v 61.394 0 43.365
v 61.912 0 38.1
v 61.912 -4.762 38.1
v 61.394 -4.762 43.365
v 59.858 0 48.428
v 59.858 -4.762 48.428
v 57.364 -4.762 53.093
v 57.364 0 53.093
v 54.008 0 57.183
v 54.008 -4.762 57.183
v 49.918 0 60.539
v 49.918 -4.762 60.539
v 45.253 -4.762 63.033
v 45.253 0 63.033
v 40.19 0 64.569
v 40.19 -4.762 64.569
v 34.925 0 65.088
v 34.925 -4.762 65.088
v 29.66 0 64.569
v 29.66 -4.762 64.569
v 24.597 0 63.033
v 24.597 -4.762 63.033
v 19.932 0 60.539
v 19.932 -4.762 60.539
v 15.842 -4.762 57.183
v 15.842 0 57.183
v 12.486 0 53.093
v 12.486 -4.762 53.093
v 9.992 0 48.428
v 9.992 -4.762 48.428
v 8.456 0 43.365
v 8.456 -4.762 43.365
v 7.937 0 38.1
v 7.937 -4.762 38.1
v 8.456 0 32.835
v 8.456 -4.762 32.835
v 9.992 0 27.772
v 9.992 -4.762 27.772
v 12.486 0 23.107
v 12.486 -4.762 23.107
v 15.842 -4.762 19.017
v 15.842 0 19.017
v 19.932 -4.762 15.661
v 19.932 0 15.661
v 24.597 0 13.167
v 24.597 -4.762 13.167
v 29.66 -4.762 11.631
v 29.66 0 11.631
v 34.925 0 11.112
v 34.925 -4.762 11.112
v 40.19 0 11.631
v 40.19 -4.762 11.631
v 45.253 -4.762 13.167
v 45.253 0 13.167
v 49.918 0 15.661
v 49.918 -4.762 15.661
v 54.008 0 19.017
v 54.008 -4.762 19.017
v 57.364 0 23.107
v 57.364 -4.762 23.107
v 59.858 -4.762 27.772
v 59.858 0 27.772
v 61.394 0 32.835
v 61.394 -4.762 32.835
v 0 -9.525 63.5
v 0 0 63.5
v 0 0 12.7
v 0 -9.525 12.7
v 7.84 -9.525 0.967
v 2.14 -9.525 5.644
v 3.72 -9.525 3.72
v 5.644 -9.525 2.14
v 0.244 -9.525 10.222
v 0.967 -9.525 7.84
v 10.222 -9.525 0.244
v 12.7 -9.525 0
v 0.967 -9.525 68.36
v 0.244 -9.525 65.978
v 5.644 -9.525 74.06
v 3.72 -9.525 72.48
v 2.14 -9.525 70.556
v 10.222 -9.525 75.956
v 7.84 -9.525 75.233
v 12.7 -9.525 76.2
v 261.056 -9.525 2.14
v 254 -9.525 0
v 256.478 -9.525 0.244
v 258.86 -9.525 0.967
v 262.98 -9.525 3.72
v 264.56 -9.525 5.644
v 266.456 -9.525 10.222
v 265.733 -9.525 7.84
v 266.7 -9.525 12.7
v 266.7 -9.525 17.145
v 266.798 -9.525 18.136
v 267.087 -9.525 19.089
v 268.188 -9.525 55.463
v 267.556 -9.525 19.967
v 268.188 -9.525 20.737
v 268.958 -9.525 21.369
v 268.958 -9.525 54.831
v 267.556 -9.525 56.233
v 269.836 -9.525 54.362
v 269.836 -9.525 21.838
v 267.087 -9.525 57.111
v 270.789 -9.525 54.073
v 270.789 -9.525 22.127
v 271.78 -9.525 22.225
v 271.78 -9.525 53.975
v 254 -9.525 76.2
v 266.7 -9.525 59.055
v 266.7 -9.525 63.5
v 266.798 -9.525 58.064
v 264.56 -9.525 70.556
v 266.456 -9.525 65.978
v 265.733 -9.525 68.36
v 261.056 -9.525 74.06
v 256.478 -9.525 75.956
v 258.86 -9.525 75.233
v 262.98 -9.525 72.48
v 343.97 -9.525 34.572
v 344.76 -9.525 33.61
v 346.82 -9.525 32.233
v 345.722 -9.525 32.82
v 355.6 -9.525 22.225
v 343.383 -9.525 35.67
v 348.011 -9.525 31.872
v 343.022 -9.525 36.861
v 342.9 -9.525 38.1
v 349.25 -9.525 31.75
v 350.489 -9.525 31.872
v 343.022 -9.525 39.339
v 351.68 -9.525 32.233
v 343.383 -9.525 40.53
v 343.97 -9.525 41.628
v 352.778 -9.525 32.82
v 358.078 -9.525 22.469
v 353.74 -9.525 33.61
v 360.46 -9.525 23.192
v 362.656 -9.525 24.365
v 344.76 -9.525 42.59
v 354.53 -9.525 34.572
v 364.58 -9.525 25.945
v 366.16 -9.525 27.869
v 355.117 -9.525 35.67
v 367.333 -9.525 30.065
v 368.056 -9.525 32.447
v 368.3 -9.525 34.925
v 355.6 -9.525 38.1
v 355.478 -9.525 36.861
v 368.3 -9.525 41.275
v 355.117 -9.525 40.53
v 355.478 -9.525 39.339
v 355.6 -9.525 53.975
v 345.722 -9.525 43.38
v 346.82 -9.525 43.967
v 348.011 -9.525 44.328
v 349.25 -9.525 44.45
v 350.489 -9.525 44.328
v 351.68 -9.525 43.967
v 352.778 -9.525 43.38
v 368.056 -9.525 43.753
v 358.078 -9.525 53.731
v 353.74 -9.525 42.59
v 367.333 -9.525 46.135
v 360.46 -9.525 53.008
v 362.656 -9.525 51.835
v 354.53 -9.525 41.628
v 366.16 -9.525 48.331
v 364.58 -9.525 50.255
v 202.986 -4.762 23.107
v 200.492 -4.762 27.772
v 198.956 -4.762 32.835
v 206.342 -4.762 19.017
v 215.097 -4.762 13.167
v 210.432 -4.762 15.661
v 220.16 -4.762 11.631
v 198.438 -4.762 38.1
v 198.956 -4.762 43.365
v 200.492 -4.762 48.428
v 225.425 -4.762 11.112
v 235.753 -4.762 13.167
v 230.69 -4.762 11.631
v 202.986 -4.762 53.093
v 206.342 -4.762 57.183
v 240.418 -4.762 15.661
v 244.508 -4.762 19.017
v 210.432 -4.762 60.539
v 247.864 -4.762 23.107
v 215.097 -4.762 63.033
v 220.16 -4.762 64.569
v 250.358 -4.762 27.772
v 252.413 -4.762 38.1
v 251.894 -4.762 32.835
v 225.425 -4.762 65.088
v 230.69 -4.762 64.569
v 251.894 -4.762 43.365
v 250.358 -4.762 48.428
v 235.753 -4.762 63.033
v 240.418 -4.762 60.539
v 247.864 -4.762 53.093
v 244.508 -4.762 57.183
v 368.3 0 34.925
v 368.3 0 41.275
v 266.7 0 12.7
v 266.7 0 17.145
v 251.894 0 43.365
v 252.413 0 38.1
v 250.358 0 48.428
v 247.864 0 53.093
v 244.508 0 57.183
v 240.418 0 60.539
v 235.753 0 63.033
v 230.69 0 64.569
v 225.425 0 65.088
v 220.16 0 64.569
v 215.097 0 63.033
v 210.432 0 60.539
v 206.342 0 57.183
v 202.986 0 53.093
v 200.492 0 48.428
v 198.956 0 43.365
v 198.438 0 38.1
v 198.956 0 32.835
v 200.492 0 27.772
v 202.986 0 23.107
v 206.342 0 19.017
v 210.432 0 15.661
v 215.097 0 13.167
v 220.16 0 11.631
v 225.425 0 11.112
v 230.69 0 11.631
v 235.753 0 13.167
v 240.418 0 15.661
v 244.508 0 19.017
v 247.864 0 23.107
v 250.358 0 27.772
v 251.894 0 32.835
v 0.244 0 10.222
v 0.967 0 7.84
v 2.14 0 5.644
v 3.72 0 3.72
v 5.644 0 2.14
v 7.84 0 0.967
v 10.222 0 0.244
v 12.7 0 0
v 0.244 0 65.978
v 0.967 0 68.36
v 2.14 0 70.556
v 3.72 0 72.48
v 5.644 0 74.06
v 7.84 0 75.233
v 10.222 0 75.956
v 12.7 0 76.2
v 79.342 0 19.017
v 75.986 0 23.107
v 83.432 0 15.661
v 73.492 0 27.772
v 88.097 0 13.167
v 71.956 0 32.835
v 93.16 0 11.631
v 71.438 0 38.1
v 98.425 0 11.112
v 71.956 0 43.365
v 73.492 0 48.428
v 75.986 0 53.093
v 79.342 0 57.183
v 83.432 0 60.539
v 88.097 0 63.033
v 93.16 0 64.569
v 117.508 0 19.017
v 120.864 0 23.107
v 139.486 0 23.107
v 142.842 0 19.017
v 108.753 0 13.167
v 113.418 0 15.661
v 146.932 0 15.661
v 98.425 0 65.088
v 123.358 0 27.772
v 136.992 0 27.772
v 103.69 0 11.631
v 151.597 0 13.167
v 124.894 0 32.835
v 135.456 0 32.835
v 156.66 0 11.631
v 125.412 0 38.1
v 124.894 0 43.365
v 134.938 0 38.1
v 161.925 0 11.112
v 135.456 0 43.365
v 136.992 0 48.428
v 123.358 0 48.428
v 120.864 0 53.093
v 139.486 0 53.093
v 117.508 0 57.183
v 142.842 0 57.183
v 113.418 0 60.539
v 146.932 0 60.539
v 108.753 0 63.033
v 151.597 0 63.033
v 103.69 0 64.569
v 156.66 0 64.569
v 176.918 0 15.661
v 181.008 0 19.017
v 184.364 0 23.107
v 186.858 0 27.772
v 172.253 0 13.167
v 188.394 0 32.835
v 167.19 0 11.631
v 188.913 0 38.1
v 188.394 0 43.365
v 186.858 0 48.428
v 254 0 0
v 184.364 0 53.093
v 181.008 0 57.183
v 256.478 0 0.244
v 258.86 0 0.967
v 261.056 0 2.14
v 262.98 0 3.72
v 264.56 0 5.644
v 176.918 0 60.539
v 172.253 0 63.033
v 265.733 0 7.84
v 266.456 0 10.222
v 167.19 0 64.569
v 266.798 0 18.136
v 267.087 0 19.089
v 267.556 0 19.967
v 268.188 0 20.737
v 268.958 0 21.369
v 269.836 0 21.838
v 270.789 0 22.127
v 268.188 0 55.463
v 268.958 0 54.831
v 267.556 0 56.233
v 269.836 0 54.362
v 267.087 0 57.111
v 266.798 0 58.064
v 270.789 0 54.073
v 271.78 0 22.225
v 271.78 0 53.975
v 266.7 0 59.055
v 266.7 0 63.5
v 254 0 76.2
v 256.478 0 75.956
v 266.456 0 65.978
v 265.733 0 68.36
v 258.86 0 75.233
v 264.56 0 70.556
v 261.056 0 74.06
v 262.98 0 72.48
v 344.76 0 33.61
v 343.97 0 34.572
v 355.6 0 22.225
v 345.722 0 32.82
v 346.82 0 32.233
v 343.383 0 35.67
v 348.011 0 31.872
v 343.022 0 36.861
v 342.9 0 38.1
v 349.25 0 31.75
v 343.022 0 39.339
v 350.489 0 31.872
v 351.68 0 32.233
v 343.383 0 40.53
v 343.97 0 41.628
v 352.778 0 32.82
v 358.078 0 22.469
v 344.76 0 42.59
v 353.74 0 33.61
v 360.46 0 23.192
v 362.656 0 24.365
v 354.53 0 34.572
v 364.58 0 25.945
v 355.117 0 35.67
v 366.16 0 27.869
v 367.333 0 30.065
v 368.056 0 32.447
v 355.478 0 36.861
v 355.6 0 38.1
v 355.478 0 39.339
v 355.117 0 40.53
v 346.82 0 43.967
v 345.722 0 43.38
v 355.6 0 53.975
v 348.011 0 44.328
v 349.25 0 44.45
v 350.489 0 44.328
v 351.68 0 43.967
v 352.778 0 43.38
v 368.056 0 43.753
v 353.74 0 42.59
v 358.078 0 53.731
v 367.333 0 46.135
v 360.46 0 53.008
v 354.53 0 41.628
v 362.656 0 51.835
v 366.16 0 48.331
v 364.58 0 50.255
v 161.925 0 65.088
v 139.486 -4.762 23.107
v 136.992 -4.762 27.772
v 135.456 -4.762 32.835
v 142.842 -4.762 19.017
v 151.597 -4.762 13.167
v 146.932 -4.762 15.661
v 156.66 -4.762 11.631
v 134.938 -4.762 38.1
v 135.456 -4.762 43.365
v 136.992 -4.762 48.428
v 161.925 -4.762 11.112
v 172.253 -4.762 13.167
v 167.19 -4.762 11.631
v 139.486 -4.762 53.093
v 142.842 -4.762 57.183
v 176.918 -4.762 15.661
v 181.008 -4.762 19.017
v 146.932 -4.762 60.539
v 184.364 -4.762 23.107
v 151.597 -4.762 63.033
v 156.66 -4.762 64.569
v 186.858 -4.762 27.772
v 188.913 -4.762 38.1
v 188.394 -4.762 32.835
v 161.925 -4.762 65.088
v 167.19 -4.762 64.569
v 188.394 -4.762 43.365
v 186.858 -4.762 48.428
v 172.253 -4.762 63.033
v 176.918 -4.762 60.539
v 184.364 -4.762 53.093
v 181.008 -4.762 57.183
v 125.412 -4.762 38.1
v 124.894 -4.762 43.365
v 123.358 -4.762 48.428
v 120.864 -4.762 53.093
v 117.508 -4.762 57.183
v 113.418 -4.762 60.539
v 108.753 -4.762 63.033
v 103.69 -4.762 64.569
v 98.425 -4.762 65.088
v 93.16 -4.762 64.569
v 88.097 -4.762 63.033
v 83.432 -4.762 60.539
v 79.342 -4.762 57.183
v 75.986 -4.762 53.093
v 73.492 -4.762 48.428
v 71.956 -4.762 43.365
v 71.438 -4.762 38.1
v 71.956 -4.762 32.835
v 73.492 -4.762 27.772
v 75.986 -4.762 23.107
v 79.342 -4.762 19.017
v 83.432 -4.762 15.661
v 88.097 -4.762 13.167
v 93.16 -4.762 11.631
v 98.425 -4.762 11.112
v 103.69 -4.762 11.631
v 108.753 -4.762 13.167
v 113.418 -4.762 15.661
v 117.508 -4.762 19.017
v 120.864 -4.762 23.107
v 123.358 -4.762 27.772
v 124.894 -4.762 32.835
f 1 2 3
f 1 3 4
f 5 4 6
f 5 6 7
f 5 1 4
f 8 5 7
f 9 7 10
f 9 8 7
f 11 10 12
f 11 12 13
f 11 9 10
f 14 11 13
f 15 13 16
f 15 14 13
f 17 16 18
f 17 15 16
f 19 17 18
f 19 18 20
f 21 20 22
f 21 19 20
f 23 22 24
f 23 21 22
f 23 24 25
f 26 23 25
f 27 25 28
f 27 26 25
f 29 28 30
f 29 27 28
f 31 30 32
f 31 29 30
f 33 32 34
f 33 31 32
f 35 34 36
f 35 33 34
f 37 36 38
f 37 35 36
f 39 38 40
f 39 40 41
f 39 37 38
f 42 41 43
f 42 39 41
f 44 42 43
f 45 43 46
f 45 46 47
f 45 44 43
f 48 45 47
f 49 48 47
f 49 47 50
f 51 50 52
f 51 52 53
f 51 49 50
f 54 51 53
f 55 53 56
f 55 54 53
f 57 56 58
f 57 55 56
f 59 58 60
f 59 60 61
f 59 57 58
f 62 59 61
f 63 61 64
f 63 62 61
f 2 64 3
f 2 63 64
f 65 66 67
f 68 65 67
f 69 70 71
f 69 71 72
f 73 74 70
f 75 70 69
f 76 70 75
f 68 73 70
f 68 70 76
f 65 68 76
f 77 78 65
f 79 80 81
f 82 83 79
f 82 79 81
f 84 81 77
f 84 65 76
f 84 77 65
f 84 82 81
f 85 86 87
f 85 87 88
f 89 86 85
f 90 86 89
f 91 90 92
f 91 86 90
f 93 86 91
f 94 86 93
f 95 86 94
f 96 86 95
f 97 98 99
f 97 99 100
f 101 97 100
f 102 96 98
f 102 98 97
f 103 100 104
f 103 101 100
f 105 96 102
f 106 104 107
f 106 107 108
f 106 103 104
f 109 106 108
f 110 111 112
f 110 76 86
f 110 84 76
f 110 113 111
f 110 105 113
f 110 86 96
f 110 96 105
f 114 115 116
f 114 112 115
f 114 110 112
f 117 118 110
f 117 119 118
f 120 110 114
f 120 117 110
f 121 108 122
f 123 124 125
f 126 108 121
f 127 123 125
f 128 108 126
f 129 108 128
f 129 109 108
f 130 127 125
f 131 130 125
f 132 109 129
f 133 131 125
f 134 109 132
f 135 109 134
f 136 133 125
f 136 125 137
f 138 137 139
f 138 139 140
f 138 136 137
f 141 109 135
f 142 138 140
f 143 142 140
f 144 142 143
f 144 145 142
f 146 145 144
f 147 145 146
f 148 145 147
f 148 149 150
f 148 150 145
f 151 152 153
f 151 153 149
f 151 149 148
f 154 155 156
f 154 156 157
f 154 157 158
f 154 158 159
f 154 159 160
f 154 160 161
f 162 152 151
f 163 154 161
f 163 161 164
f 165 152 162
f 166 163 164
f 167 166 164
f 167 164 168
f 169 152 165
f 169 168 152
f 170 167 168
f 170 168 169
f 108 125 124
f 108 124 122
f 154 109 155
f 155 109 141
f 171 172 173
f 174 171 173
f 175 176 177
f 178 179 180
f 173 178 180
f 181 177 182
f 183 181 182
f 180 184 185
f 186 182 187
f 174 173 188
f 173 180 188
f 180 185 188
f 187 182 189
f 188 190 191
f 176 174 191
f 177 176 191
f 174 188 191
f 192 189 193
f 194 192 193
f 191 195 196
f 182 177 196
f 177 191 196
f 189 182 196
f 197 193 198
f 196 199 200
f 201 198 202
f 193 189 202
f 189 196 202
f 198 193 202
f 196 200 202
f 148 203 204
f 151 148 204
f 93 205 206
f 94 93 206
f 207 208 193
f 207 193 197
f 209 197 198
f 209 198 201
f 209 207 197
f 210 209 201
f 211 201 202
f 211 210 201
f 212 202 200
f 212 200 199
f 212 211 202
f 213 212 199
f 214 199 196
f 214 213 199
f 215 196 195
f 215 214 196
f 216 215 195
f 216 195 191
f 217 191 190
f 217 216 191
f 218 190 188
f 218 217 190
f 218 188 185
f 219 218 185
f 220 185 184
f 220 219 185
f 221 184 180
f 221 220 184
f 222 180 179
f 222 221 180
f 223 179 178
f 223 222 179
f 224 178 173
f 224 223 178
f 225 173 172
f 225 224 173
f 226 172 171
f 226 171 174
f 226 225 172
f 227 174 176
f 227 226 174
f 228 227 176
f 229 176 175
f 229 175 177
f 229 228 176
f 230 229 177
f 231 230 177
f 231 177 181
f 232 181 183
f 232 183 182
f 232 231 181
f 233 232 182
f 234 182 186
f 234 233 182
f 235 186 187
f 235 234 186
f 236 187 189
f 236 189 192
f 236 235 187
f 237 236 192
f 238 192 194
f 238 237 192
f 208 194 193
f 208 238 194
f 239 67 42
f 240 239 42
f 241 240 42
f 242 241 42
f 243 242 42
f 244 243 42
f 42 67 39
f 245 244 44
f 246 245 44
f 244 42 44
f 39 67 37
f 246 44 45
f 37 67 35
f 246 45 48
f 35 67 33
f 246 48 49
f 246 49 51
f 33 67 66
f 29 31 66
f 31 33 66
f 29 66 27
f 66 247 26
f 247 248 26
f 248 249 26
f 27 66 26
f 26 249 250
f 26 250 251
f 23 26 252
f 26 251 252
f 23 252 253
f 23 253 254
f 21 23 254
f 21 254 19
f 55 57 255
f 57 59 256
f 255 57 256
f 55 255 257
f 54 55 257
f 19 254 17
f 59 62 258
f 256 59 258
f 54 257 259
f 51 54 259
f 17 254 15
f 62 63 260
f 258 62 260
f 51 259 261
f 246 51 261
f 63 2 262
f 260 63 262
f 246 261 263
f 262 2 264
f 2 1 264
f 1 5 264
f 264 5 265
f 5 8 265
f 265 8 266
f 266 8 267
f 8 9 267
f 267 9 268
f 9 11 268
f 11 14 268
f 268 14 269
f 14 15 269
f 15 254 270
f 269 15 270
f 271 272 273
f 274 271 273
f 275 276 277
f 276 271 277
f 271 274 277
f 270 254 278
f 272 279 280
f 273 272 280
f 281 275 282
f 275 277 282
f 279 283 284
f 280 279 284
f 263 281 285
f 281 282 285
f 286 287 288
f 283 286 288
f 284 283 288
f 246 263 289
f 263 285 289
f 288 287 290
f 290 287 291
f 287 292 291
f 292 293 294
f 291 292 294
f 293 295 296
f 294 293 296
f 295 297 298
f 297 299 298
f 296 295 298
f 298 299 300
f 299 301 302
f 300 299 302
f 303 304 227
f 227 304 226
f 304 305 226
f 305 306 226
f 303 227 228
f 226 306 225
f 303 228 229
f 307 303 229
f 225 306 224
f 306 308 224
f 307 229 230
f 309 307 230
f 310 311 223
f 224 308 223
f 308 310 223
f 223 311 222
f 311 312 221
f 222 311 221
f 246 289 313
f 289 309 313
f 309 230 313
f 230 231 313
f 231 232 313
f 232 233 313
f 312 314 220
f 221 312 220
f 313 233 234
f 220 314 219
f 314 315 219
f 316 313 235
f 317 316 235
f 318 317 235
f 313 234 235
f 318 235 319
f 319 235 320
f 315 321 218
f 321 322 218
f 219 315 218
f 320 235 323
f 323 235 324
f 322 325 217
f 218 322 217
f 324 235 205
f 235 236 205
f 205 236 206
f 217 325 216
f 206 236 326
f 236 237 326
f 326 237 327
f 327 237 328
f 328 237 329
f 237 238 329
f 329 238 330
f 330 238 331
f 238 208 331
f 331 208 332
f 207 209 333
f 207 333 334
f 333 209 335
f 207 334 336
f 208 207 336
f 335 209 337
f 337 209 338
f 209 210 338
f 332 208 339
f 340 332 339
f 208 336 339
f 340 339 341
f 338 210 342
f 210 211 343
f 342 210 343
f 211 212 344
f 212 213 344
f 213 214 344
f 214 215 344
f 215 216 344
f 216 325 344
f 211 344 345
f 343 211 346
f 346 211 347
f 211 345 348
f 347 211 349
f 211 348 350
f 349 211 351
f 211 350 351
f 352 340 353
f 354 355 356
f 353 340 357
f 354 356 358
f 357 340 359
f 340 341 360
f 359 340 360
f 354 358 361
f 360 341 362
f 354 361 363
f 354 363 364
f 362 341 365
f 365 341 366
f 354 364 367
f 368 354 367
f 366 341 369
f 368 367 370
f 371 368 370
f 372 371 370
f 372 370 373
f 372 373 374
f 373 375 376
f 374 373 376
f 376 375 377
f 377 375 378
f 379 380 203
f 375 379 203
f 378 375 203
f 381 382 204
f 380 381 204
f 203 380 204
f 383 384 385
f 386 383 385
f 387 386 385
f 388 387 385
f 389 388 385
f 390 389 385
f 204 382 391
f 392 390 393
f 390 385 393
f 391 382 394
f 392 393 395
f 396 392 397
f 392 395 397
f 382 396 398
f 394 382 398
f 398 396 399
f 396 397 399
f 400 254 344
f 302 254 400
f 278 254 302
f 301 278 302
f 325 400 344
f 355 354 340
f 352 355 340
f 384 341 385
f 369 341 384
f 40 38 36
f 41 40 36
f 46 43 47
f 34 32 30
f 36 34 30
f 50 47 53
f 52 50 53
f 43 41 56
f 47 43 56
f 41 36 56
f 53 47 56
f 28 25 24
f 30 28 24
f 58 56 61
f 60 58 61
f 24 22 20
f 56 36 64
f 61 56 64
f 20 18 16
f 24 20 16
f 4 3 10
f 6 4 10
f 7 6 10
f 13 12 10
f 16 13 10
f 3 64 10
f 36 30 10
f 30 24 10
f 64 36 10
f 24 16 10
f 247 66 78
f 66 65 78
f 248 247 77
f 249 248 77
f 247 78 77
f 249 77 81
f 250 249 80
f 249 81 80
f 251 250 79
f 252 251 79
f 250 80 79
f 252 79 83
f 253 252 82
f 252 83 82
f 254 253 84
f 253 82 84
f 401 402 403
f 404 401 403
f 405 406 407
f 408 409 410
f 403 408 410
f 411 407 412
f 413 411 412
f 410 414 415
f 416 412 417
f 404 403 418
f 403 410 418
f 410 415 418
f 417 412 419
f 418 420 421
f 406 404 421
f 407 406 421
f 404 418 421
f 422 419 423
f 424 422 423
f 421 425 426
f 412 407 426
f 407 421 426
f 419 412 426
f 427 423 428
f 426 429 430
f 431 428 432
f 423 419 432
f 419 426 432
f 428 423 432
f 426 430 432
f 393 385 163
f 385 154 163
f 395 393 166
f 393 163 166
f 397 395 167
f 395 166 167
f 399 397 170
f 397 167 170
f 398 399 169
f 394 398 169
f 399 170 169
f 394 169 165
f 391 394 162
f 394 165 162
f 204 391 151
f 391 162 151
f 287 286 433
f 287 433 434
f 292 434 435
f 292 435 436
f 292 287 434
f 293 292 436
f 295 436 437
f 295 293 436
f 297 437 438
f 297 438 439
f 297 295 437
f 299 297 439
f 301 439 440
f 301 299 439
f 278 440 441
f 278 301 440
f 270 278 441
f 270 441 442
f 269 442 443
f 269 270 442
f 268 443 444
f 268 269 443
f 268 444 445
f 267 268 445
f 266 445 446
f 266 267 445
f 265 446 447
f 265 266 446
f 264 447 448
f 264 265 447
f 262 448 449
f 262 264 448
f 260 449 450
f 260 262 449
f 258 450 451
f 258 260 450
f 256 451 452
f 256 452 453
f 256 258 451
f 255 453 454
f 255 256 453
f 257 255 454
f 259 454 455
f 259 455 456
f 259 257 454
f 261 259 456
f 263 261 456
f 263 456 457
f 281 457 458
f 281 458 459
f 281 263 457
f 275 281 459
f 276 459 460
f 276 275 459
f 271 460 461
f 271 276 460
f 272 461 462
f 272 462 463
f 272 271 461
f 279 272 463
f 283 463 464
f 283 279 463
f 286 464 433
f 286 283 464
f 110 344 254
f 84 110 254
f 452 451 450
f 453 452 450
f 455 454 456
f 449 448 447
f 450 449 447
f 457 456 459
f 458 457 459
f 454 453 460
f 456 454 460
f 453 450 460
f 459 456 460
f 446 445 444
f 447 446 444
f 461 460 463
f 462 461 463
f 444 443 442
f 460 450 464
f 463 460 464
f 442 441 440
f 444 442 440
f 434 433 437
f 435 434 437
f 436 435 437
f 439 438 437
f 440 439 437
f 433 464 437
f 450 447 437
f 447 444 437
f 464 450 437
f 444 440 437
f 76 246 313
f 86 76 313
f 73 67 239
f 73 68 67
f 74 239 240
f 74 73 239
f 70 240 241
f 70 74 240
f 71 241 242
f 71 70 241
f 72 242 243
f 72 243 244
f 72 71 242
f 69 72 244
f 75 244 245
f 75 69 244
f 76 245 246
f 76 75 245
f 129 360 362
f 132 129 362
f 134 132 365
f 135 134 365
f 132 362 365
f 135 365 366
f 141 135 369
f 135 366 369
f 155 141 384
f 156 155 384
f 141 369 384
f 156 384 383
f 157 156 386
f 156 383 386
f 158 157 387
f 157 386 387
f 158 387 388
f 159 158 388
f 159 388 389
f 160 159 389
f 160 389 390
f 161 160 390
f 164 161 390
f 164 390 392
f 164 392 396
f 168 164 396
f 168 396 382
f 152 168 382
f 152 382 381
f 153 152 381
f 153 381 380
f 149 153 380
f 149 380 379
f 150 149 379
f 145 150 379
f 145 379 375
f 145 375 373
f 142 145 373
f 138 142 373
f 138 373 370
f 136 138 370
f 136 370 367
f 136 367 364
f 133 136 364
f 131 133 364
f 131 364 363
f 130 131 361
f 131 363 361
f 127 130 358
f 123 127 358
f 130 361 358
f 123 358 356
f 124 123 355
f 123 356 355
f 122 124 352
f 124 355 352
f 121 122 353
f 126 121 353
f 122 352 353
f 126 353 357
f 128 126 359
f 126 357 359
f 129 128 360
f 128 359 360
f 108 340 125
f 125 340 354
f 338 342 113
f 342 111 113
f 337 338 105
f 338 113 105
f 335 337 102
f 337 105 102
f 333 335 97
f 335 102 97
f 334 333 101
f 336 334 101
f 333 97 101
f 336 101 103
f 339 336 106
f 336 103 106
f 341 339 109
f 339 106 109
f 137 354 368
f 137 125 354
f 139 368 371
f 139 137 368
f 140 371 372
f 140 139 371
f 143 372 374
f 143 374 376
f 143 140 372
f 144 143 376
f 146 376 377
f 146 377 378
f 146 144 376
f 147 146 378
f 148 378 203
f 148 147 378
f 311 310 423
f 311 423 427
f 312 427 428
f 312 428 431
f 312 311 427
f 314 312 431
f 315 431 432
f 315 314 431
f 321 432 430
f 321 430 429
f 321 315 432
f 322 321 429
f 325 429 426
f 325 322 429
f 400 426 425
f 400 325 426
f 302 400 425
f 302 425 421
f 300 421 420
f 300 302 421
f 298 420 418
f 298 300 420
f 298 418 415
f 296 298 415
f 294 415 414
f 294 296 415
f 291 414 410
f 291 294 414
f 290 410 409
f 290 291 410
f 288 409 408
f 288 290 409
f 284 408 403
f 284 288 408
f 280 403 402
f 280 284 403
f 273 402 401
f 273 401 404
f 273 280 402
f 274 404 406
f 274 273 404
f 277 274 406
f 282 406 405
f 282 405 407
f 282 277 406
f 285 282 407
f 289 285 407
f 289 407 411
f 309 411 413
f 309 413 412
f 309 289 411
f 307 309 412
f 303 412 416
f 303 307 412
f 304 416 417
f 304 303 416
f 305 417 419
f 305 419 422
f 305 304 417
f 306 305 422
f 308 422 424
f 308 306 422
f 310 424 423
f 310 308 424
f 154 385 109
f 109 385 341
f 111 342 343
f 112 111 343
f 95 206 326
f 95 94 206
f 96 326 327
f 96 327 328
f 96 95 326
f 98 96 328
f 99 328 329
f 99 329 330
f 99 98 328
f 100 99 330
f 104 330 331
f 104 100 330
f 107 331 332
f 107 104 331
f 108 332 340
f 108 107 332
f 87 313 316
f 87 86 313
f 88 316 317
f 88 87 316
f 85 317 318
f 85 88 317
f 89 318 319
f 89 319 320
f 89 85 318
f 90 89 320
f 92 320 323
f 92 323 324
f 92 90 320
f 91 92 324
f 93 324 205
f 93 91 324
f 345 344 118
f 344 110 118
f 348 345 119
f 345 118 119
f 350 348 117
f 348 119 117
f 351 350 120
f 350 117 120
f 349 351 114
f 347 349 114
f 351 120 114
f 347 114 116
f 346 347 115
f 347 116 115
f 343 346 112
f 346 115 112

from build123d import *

# Parameters (mm, degrees)
F0_R     = 26.9875
F1_DEPTH = 9.525
F2_DEPTH = 4.7625
F3_R     = 12.7
F4_R     = 6.35
F5_DEPTH = 9.526
F6_R     = 5.08


with BuildPart() as f1:
    # F0 (on Front) → F1 (new body)
    with BuildSketch(Plane.XZ):
        Polygon((0, 76.2), (0, 0), (266.7, 0), (266.7, 22.225), (368.3, 22.225), (368.3, 53.975), (266.7, 53.975), (266.7, 76.2), align=None)
        with Locations((34.925, 38.1)):
            Circle(F0_R, mode=Mode.SUBTRACT)
        with Locations((98.425, 38.1)):
            Circle(F0_R, mode=Mode.SUBTRACT)
        with Locations((161.925, 38.1)):
            Circle(F0_R, mode=Mode.SUBTRACT)
        with Locations((225.425, 38.1)):
            Circle(F0_R, mode=Mode.SUBTRACT)
        with Locations((34.925, 38.1)):
            Circle(F0_R)
        with Locations((98.425, 38.1)):
            Circle(F0_R)
        with Locations((161.925, 38.1)):
            Circle(F0_R)
        with Locations((225.425, 38.1)):
            Circle(F0_R)
    extrude(amount=F1_DEPTH)

    # F0 (on Front) → F2 (cut)
    with BuildSketch(Plane.XZ):
        with Locations((225.425, 38.1)):
            Circle(F0_R)
        with Locations((161.925, 38.1)):
            Circle(F0_R)
        with Locations((98.425, 38.1)):
            Circle(F0_R)
        with Locations((34.925, 38.1)):
            Circle(F0_R)
    extrude(amount=F2_DEPTH, mode=Mode.SUBTRACT)

    # F3
    f3_edges = [f1.edges().sort_by_distance(p)[0] for p in [
        (0, -4.7625, 76.2),
        (0, -4.7625, 0),
        (266.7, -4.7625, 76.2),
        (266.7, -4.7625, 0),
        (368.3, -4.7625, 53.975),
        (368.3, -4.7625, 22.225),
    ]]
    fillet(f3_edges, radius=F3_R)

    # F4 (on face) → F5 (cut, through all)
    with BuildSketch(Plane(origin=(0, 0, 0), x_dir=(-1, 0, 0), z_dir=(0, 1, 0))):
        with Locations((-349.25, 38.1)):
            Circle(F4_R)
    extrude(amount=-F5_DEPTH, mode=Mode.SUBTRACT)

    # F6
    f6_edges = [f1.edges().sort_by_distance(p)[0] for p in [
        (266.7, -4.7625, 53.975),
        (266.7, -4.7625, 22.225),
    ]]
    fillet(f6_edges, radius=F6_R)


solid = f1.part
